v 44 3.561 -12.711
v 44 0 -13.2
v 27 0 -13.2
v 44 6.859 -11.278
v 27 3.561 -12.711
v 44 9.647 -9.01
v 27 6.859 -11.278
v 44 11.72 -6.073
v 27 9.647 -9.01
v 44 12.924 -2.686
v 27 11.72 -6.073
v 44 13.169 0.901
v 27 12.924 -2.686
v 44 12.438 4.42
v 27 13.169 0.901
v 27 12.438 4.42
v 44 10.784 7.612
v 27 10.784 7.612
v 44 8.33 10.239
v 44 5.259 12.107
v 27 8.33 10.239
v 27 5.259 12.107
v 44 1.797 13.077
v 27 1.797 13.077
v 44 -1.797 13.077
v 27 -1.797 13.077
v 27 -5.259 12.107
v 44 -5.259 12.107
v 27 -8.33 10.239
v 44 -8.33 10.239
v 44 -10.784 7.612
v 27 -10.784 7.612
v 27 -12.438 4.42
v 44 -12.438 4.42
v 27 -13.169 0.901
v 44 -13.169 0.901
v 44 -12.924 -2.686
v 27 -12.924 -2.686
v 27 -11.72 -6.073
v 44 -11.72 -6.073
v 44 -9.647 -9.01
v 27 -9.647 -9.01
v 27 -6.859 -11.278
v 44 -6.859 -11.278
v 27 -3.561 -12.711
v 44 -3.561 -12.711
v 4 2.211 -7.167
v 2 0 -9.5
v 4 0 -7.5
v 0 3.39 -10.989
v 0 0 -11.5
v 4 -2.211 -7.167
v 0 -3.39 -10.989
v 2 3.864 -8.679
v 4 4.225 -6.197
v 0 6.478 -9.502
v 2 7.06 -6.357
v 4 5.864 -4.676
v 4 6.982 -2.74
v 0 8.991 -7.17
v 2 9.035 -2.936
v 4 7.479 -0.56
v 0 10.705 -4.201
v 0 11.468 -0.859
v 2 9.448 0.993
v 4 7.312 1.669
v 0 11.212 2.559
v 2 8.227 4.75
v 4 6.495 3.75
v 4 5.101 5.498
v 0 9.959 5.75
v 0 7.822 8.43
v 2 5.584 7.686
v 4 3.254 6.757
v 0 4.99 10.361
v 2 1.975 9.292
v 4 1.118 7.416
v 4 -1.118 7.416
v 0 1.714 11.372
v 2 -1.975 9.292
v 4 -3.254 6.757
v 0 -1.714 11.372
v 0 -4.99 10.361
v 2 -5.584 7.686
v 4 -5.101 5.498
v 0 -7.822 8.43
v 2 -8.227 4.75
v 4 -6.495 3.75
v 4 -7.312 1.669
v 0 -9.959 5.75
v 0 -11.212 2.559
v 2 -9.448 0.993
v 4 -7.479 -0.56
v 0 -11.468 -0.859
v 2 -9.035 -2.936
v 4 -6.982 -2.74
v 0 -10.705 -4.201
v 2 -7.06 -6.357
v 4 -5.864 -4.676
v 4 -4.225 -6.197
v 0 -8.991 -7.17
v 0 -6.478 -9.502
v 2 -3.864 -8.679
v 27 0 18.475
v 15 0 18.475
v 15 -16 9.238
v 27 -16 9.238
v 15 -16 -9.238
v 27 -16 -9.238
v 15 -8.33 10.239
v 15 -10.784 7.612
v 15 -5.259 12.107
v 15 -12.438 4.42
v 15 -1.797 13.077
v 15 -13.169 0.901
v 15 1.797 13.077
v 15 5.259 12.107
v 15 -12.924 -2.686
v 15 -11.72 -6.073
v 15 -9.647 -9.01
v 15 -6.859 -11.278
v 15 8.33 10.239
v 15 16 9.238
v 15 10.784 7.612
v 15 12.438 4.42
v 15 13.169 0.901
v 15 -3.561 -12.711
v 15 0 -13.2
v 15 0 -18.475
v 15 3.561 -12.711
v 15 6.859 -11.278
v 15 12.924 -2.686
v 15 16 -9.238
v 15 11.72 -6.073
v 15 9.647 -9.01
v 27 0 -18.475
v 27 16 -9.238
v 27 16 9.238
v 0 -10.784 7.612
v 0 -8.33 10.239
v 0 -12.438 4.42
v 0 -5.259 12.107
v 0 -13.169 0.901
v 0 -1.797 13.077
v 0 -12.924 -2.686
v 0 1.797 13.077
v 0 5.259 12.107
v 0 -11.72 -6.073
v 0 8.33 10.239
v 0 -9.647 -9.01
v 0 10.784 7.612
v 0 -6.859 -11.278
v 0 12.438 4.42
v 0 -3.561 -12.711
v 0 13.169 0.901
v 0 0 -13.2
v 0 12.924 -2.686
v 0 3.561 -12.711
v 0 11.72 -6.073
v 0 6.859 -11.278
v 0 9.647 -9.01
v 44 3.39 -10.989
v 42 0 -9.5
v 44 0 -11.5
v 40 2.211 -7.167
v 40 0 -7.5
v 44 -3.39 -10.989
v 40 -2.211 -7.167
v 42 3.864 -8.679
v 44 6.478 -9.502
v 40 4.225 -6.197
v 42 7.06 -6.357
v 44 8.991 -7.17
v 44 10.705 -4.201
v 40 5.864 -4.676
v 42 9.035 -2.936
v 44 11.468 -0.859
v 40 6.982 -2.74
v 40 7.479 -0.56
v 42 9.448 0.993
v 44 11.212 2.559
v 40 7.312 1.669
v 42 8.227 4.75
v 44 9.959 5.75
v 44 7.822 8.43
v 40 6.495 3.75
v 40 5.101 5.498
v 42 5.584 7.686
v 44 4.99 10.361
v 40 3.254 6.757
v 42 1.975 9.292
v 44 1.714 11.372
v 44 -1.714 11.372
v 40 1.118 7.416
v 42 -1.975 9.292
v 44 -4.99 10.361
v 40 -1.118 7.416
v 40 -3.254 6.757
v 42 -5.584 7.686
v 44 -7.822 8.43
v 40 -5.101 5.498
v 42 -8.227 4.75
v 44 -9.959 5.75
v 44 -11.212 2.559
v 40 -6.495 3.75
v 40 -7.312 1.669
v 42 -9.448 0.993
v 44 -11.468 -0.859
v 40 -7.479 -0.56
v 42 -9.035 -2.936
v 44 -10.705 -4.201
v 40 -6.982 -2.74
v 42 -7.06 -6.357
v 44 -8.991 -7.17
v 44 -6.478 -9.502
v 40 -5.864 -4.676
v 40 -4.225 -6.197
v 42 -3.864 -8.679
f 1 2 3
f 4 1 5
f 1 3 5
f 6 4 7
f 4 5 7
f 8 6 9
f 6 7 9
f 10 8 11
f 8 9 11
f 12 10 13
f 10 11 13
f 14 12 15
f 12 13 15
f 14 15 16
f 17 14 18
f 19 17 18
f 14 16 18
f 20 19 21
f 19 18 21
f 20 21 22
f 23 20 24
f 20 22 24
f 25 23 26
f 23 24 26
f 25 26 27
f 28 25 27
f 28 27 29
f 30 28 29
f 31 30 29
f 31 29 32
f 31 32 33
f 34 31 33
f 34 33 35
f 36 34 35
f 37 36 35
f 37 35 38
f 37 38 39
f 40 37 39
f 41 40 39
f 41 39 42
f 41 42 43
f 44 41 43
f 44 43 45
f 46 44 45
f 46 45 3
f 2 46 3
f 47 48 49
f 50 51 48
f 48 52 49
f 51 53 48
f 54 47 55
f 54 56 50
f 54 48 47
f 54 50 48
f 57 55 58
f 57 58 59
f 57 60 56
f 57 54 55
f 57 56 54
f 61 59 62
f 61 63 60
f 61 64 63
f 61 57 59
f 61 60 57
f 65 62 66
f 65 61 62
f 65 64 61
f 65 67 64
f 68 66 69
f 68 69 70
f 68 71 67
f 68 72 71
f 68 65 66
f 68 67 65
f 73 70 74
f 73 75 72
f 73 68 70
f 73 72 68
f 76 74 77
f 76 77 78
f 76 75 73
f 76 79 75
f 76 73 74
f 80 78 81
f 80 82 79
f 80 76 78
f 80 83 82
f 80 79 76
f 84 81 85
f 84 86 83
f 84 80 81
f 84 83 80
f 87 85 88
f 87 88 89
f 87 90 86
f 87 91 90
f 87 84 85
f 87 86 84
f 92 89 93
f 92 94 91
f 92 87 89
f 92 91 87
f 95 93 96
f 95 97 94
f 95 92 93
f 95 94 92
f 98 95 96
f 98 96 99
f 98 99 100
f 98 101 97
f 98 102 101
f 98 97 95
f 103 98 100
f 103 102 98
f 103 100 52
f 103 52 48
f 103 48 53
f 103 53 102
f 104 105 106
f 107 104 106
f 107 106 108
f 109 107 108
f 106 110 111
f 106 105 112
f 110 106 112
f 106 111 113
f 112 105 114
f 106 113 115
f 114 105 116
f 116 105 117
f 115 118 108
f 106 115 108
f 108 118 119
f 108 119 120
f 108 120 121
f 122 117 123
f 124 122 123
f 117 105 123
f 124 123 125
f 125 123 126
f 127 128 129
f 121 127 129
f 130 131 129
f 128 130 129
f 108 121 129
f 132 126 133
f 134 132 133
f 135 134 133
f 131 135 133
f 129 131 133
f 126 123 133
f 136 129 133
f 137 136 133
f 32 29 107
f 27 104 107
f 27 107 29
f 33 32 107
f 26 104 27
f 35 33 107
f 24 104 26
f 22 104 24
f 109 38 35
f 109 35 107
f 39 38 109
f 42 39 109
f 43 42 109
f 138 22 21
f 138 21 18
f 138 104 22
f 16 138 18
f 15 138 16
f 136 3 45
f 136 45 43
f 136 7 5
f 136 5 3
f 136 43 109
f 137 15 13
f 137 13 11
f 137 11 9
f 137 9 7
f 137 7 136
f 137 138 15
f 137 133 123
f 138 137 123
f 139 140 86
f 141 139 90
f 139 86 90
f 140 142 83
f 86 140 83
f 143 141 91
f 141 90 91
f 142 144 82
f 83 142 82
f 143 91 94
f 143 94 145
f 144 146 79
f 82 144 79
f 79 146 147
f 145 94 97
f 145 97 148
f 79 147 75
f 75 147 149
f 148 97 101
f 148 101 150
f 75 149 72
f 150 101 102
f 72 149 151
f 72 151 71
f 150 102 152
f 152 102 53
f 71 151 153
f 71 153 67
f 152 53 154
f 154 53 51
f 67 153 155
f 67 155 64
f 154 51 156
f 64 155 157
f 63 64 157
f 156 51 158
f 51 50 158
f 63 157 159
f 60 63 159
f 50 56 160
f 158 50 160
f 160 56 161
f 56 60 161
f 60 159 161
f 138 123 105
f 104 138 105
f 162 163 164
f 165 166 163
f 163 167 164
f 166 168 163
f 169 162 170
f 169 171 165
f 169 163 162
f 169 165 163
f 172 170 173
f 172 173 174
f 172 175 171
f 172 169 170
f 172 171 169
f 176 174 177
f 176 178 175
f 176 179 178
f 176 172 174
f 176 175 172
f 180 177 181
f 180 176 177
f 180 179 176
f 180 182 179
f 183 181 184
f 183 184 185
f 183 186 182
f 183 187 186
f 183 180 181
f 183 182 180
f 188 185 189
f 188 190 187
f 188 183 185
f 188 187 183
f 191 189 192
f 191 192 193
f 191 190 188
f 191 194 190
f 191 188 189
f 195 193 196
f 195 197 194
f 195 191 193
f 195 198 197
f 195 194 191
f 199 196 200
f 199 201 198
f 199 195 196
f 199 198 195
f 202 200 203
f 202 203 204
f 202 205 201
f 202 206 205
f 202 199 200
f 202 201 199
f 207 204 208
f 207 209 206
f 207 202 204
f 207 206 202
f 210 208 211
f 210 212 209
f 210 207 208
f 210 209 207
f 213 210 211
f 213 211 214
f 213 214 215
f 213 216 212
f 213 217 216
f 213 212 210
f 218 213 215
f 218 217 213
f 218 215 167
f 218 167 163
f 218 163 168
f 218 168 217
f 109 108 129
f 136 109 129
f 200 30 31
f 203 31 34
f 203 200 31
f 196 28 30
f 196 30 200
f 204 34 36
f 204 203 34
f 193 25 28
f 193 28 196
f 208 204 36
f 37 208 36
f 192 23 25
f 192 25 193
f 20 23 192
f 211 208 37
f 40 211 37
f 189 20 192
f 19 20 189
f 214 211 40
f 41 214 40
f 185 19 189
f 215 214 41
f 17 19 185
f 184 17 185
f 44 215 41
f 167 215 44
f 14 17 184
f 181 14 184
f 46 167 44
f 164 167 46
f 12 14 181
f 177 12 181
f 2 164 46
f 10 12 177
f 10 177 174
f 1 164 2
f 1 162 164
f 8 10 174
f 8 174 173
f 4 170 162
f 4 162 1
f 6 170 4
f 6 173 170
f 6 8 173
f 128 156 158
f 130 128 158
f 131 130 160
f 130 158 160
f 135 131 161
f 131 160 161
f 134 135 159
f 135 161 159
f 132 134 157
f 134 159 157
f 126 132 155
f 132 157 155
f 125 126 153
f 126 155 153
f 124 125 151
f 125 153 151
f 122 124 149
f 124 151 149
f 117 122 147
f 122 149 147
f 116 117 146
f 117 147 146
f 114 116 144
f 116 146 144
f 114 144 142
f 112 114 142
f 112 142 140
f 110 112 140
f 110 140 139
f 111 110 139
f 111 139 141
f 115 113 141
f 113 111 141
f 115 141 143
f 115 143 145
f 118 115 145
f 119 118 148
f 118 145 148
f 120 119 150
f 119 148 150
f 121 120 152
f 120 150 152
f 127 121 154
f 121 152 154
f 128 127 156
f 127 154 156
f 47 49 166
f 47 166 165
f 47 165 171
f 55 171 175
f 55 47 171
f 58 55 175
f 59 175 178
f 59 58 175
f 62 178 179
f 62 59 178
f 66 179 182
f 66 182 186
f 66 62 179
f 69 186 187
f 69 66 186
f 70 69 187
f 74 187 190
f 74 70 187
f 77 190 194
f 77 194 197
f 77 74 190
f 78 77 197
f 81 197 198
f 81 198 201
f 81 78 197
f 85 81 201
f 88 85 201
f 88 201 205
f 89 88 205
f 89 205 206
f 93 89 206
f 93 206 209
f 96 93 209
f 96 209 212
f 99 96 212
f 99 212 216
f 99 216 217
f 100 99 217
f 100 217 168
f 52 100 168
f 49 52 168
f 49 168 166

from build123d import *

# Parameters (mm, degrees)
SZKIC1_R                    = 13.2
SZKIC1_R_2                  = 7.5
DODANIE_WYCI_GNI_CIE1_DEPTH = 44
DODANIE_WYCI_GNI_CIE2_DEPTH = 12
SFAZOWANIE1_SIZE            = 4
SZKIC8_R                    = 7.5
WYTNIJ_WYCI_GNI_CIE1_DEPTH  = 12
SFAZOWANIE2_SIZE            = 4


with BuildPart() as part:
    # Szkic1 → Dodanie-wyciągnięcie1 (new body)
    with BuildSketch(Plane(origin=(0, 0, 0), x_dir=(0, 0, -1), z_dir=(1, 0, 0))):
        Circle(SZKIC1_R)
        Circle(SZKIC1_R_2, mode=Mode.SUBTRACT)
    extrude(amount=DODANIE_WYCI_GNI_CIE1_DEPTH)

    # Szkic6 → Dodanie-wyciągnięcie2 (add)
    with BuildSketch(Plane(origin=(15, 0, 0), x_dir=(0, 0, -1), z_dir=(1, 0, 0))):
        Polygon((18.475208614, 0), (9.237604307, 16), (-9.237604307, 16), (-18.475208614, 0), (-9.237604307, -16), (9.237604307, -16), align=None)
    extrude(amount=DODANIE_WYCI_GNI_CIE2_DEPTH)

    # Sfazowanie1
    sfazowanie1_edges = [part.edges().sort_by_distance(p)[0] for p in [
        (44, 0, 7.5),
    ]]
    chamfer(sfazowanie1_edges, length=SFAZOWANIE1_SIZE)

    # Szkic8 → Wytnij-wyciągnięcie1 (cut)
    with BuildSketch(Plane.ZY.offset(-15)):
        with Locations(Location((0, 0, 0), (0, 0, 180))):
            Circle(SZKIC8_R)
    extrude(amount=-WYTNIJ_WYCI_GNI_CIE1_DEPTH, mode=Mode.SUBTRACT)

    # Sfazowanie2
    sfazowanie2_edges = [part.edges().sort_by_distance(p)[0] for p in [
        (0, 0, 7.5),
    ]]
    chamfer(sfazowanie2_edges, length=SFAZOWANIE2_SIZE)


solid = part.part
